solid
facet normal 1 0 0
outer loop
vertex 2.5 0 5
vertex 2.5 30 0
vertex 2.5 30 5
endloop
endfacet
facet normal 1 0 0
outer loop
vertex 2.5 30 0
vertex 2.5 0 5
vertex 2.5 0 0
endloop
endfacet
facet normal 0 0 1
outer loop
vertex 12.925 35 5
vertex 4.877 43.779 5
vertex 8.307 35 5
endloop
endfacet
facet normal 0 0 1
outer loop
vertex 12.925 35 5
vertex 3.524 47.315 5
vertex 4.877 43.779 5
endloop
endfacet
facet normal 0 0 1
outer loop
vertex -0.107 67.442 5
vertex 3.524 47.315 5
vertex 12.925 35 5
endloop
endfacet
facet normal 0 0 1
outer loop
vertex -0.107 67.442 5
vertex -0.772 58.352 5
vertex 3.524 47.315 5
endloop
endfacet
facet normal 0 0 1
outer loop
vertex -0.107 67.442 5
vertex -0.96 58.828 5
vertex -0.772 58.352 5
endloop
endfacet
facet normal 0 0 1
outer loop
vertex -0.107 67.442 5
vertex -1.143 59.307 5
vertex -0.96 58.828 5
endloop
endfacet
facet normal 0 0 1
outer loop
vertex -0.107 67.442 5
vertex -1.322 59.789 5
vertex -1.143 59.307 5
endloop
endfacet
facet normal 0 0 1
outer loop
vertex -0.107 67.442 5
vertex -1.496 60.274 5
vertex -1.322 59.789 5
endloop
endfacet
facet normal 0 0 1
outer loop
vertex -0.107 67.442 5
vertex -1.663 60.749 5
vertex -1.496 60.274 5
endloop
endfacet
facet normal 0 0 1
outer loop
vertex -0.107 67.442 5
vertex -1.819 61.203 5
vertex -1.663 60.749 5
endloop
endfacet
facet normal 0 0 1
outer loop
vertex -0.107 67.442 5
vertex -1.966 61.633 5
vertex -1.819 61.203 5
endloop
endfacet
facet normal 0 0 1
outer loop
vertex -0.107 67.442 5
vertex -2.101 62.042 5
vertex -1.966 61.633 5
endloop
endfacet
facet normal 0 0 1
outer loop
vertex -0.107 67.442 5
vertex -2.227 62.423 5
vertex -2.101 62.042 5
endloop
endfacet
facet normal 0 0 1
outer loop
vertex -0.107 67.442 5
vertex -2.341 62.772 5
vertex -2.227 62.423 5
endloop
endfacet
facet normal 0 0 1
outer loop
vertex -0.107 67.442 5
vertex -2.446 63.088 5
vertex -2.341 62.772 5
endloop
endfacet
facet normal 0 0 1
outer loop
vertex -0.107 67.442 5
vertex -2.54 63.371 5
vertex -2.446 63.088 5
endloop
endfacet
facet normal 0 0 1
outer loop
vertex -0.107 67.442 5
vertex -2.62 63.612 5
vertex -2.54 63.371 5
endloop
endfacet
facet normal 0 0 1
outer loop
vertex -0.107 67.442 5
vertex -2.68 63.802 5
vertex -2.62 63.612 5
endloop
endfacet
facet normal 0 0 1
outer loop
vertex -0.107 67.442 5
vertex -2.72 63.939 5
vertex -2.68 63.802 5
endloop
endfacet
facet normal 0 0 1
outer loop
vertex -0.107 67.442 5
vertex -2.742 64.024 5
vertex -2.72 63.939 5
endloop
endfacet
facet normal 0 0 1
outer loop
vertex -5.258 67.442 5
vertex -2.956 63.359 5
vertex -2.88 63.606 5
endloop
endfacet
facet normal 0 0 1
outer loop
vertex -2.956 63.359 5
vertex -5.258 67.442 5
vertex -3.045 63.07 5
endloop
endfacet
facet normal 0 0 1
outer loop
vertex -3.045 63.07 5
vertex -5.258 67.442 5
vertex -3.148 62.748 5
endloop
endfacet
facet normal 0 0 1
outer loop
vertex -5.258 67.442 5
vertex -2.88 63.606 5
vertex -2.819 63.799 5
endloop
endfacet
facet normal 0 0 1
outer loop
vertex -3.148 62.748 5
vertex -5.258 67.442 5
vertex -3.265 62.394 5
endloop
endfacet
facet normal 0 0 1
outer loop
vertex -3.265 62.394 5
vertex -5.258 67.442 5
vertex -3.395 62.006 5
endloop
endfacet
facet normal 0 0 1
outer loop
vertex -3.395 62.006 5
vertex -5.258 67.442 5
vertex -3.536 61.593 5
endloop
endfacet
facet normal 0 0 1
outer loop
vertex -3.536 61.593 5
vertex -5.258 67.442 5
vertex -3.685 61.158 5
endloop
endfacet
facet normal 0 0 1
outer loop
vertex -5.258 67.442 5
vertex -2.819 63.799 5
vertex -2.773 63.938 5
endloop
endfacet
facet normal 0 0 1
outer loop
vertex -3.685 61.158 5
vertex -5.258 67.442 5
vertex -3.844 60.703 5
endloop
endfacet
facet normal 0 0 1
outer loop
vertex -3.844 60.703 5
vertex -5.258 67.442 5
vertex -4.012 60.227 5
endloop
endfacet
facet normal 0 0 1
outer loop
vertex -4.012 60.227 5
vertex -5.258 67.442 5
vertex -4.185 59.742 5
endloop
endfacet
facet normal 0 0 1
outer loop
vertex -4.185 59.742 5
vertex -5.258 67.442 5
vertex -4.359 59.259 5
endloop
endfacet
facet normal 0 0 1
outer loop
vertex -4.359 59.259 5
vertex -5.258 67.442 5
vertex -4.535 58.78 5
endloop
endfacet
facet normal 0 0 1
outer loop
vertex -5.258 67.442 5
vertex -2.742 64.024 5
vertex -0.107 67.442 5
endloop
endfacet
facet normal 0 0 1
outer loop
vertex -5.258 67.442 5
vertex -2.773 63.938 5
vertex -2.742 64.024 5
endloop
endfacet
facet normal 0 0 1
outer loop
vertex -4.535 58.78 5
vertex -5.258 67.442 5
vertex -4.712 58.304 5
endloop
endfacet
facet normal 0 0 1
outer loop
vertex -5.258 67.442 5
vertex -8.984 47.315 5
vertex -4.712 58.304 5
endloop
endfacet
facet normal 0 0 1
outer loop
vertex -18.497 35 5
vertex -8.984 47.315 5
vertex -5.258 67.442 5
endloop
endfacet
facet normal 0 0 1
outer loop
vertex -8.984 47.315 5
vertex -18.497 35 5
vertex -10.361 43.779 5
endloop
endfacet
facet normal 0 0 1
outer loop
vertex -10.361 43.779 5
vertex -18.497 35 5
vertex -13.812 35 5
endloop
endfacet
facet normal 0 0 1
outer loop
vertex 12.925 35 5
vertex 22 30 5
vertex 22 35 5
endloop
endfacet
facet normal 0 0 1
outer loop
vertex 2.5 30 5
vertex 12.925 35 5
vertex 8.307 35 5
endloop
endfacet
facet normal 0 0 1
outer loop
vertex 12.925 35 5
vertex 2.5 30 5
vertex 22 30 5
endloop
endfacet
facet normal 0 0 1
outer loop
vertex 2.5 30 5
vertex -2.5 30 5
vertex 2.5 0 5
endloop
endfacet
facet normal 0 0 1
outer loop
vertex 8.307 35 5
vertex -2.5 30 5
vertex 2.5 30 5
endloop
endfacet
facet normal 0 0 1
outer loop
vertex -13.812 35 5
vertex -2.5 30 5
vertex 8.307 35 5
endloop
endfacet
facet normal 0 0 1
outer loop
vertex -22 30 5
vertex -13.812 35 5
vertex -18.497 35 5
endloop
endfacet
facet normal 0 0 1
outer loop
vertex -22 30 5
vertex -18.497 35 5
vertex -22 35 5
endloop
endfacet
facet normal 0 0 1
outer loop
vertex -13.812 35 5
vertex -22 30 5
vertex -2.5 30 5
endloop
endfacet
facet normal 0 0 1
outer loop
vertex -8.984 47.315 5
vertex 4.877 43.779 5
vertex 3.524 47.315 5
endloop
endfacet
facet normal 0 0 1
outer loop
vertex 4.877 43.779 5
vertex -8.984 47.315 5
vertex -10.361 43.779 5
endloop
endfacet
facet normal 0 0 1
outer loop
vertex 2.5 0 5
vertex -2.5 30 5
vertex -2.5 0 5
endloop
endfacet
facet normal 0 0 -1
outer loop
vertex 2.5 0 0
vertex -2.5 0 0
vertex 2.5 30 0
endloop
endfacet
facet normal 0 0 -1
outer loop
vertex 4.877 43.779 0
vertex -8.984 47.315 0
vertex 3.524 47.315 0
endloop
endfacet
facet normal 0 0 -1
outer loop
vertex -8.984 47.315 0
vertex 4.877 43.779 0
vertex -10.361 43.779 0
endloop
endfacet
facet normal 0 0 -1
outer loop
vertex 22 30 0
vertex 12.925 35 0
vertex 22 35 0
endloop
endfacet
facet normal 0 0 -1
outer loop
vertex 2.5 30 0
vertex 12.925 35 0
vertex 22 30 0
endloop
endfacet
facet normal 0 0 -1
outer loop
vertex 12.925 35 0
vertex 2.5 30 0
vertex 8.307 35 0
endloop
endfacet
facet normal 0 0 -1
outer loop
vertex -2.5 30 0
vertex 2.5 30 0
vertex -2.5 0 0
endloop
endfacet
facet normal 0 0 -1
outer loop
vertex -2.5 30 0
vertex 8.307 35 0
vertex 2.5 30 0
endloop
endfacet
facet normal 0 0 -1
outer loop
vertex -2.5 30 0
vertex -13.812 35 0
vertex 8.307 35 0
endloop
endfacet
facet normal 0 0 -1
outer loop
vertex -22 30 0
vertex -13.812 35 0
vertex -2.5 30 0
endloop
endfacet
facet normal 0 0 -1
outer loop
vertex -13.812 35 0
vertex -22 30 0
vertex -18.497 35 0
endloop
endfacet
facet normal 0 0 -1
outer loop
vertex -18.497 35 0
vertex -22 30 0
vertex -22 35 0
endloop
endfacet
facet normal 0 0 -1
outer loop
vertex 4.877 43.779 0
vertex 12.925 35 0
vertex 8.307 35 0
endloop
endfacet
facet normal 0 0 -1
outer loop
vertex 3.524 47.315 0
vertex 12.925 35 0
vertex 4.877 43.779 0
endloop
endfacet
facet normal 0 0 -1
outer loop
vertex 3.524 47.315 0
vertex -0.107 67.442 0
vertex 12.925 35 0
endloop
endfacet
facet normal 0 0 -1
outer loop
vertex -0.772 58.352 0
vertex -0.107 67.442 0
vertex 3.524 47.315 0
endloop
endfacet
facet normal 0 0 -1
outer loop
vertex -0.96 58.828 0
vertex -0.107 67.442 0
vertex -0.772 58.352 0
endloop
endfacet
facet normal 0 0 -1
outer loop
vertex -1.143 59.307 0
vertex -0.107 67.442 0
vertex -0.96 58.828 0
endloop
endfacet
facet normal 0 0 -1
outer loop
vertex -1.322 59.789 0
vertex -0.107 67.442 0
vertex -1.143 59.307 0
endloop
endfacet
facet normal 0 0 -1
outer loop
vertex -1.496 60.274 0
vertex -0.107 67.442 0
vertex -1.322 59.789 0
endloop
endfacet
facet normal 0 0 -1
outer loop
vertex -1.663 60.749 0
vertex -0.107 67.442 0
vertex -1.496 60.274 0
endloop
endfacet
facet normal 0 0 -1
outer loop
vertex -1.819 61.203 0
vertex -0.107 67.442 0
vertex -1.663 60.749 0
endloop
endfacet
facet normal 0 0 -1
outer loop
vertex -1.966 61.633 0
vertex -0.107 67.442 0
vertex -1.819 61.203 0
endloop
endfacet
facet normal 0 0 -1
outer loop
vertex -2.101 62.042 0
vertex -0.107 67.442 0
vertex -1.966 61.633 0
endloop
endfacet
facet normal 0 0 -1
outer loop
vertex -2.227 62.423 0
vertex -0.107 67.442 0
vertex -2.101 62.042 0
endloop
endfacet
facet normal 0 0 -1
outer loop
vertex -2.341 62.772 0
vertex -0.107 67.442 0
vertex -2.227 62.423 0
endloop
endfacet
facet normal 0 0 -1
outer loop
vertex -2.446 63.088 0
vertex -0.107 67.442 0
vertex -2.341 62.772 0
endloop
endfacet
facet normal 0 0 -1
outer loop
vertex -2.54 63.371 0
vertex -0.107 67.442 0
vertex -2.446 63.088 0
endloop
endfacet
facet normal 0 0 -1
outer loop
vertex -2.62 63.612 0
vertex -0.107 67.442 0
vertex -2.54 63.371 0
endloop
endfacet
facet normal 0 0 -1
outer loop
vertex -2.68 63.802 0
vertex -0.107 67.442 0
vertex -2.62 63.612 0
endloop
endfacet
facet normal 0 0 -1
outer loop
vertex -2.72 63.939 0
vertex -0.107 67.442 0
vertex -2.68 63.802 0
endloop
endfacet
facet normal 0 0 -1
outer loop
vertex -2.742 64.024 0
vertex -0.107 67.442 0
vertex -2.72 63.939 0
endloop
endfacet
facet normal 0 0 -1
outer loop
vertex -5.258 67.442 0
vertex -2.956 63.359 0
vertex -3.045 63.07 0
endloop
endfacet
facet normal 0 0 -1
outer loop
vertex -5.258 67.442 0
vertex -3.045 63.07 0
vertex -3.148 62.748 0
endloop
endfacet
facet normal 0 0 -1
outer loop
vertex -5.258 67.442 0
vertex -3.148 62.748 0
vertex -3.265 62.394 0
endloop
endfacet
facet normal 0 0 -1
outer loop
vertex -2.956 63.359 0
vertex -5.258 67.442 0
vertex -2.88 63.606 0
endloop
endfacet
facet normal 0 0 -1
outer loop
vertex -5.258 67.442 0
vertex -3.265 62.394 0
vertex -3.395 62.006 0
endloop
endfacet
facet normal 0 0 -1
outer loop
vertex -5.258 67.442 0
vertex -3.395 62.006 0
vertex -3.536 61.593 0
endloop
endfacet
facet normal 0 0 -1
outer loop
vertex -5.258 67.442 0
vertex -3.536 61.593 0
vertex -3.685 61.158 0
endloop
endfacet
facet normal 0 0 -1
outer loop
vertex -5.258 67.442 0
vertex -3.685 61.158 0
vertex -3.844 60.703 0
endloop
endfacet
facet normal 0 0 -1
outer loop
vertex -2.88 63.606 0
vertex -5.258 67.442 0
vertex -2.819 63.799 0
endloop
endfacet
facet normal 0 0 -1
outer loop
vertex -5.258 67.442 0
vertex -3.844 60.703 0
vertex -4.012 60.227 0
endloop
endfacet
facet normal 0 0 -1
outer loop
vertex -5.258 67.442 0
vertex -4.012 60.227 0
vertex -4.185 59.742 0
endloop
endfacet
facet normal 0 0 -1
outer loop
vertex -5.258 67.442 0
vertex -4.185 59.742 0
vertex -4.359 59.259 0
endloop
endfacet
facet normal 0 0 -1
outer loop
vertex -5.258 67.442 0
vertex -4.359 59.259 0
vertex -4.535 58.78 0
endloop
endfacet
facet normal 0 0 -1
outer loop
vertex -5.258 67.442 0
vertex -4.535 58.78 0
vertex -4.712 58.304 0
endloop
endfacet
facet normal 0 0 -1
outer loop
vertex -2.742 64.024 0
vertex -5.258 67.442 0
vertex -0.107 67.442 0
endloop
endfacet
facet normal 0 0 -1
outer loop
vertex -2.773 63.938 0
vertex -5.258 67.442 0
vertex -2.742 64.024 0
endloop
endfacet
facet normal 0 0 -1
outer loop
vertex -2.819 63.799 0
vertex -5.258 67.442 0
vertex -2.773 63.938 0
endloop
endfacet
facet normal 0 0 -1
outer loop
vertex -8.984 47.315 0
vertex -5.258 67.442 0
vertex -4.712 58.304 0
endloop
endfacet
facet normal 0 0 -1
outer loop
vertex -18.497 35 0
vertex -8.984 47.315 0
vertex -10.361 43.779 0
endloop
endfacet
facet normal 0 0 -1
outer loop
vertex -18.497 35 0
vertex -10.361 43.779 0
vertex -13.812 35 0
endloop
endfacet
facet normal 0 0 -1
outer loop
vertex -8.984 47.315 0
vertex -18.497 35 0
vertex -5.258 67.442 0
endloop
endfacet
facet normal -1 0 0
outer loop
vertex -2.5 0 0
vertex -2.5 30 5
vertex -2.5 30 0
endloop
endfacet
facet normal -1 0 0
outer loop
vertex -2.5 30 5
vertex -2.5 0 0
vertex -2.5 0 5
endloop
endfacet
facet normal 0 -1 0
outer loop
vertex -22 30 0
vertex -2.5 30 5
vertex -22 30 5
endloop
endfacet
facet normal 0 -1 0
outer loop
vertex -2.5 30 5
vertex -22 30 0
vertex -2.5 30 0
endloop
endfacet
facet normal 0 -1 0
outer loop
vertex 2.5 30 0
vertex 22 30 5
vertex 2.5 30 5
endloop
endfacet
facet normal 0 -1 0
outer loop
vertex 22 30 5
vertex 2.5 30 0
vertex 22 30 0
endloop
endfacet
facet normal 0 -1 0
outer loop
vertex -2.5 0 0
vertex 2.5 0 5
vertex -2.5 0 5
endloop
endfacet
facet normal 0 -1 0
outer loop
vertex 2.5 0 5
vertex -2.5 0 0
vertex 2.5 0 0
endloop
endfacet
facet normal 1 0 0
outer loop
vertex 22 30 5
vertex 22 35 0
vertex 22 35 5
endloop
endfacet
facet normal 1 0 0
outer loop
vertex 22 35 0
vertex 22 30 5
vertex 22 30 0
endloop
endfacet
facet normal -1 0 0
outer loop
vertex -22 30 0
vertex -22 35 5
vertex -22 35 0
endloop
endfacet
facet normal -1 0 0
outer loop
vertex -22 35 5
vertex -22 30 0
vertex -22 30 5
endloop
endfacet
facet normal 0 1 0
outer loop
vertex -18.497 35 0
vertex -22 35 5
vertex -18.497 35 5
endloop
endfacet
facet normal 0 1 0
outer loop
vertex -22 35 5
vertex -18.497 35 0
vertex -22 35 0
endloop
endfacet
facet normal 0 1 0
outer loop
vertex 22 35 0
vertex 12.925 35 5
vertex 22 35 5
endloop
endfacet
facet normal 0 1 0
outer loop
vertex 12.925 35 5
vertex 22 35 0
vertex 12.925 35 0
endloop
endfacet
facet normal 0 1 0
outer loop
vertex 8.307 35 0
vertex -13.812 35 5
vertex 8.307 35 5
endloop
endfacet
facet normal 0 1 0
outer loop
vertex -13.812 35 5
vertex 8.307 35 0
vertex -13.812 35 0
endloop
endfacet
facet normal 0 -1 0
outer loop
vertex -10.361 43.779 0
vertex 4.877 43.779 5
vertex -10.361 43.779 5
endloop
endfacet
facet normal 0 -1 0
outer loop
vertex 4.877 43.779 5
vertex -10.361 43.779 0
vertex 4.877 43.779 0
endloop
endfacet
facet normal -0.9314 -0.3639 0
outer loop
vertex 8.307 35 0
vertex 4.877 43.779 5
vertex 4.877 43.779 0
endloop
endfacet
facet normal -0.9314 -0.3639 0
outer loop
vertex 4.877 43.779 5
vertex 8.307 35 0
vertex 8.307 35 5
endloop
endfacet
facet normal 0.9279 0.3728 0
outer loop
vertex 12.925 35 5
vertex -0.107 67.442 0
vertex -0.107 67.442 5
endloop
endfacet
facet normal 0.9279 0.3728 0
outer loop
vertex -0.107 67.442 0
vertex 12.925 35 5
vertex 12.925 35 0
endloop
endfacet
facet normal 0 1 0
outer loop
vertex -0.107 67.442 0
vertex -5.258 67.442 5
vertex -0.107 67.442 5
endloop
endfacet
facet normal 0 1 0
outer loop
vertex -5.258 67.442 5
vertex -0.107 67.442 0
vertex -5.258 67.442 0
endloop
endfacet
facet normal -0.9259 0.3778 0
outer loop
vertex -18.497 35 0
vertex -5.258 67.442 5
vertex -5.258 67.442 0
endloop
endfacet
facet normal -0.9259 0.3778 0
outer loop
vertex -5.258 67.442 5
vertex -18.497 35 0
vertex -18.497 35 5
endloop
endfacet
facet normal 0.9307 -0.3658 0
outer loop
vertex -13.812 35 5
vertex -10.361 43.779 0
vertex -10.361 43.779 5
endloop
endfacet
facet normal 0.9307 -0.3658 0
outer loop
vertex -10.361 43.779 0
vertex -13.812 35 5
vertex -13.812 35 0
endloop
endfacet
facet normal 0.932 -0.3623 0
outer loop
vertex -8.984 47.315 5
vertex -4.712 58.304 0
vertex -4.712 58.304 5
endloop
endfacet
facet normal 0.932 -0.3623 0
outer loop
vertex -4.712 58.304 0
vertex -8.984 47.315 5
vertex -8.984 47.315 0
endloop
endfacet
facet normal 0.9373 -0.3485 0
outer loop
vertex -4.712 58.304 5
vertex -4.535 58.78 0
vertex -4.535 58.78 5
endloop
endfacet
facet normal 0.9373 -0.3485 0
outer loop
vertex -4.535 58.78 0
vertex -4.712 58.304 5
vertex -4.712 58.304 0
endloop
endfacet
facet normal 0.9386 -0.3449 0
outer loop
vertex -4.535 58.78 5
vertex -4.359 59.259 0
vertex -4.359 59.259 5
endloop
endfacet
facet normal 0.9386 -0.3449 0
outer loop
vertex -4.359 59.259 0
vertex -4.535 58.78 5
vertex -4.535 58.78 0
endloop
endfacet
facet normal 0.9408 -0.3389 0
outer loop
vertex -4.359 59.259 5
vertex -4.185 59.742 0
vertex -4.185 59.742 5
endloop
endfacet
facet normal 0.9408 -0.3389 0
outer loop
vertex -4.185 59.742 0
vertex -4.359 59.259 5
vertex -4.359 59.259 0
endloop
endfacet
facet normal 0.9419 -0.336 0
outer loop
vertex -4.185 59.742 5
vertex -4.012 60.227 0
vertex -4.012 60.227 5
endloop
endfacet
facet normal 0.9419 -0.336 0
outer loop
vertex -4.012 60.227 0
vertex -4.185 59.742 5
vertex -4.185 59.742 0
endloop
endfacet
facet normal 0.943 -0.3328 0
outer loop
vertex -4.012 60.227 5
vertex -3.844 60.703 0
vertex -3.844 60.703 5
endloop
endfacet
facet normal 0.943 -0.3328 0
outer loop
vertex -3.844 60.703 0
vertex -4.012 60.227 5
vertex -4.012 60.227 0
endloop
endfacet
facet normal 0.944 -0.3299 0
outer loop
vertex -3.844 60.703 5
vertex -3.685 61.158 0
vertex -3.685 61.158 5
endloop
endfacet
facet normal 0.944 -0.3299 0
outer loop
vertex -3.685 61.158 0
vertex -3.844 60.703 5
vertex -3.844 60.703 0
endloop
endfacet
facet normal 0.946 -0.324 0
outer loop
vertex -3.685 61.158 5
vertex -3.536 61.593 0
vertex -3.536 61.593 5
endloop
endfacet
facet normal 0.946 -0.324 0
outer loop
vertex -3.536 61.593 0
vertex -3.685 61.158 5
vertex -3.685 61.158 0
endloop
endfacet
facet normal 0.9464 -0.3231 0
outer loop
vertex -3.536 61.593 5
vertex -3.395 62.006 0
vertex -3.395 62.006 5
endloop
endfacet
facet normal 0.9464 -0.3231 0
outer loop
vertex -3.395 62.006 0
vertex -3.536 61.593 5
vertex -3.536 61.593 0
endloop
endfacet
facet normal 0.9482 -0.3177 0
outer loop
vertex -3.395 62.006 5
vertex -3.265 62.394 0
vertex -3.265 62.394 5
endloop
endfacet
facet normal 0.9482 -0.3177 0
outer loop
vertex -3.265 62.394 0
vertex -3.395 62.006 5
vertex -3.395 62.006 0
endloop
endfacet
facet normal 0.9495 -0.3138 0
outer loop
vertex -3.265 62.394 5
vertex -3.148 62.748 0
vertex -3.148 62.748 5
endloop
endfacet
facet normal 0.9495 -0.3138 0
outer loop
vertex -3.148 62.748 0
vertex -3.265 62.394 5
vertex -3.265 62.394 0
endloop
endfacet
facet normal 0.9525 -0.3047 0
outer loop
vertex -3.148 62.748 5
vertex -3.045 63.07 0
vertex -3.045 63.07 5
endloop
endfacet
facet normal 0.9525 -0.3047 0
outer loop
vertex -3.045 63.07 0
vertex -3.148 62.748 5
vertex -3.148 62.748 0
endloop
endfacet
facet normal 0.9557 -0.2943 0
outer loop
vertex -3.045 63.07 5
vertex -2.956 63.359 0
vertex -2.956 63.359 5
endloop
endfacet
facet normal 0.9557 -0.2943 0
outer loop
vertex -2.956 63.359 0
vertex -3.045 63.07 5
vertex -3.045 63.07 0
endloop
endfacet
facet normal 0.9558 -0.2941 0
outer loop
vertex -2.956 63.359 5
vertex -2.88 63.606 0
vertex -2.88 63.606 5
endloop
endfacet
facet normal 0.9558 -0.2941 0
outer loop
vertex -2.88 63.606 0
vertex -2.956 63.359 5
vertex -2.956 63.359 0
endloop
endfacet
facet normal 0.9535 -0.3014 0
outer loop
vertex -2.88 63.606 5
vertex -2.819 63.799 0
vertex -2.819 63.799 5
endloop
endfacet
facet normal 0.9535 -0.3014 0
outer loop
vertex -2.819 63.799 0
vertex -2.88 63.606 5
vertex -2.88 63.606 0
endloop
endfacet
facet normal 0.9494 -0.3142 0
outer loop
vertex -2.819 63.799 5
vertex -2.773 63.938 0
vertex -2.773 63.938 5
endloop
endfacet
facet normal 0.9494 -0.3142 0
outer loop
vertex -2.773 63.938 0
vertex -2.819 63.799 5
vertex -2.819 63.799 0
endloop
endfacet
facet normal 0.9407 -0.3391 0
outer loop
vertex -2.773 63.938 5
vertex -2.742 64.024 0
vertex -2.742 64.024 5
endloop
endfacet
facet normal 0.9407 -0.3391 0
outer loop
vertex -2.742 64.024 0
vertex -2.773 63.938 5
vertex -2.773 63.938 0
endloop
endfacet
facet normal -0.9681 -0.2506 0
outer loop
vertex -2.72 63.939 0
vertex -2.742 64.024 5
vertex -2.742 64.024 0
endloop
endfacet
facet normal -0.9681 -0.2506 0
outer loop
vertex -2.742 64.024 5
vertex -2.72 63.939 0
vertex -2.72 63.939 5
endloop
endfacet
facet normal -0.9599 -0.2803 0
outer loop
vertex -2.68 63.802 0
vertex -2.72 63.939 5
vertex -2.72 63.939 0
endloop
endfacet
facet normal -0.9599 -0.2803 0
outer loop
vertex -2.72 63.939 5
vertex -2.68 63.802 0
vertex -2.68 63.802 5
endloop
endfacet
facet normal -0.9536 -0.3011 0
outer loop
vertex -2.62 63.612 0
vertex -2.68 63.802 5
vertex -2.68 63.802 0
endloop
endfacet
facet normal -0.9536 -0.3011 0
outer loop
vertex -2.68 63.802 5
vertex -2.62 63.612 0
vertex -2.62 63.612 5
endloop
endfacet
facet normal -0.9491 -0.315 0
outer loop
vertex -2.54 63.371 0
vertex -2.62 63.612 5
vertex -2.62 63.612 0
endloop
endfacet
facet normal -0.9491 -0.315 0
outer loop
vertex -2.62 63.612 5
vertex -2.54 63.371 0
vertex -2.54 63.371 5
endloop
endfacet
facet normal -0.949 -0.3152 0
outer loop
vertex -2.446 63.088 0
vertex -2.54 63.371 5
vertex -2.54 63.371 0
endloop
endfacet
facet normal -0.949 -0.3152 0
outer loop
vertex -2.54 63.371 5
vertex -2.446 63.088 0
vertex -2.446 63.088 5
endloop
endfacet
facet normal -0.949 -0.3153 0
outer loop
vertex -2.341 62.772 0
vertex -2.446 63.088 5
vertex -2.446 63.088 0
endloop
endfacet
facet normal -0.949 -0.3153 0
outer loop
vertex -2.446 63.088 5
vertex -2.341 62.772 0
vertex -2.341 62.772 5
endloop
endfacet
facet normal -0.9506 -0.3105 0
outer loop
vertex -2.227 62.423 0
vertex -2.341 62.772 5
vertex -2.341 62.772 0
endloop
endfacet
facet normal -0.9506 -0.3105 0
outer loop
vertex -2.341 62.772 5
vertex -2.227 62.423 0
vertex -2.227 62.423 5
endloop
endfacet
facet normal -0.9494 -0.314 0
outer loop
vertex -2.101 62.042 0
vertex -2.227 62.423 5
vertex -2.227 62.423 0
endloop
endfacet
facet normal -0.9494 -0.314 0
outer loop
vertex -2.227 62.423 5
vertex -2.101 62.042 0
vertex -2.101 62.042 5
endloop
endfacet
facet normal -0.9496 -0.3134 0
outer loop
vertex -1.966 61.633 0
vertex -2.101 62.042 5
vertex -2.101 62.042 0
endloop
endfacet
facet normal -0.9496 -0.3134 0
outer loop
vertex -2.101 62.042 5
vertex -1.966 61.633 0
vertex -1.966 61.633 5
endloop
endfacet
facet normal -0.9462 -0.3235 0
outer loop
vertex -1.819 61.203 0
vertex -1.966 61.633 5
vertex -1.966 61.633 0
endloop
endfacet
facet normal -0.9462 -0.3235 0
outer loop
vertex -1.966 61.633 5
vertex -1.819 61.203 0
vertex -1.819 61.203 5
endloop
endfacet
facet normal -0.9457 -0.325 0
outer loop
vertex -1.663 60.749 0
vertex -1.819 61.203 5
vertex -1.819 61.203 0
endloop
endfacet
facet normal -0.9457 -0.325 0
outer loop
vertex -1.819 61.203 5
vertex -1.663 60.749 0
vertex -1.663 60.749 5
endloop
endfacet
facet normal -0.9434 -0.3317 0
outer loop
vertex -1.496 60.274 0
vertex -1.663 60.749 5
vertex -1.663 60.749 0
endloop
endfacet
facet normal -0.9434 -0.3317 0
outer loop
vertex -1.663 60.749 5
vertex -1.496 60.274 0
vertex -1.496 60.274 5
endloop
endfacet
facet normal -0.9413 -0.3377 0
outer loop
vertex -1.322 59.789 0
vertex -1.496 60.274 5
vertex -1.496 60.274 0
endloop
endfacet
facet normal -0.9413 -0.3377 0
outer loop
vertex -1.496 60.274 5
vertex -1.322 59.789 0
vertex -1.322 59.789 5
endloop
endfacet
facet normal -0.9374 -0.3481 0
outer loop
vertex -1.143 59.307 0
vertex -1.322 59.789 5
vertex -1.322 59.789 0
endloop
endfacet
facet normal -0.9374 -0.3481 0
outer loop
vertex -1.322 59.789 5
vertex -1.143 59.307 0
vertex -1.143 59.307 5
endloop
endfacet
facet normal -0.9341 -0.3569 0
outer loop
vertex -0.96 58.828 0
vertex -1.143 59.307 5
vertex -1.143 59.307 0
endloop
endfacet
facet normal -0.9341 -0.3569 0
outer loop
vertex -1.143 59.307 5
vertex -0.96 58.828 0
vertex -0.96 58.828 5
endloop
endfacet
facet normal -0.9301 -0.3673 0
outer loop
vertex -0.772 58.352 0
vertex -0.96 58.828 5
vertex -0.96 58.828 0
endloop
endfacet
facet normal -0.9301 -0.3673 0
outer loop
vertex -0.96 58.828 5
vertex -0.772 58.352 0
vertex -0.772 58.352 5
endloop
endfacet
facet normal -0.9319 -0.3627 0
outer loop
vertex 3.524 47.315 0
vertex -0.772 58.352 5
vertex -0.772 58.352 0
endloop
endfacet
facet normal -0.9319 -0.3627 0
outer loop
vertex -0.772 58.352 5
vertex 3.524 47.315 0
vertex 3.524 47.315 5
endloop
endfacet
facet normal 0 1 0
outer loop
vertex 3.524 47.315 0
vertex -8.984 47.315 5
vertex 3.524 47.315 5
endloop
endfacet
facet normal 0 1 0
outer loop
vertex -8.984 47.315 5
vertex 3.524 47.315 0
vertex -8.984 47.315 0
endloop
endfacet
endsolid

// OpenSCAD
// Olimpics 2016
// By Magonegro JUL-2016
// Customizer for the Olympics Rio2016 rotating logo

// Stake height
HEIGHT=30;
// Custom text in the platter:
TEXT="A";
// Text size:
TEXTSIZE=35;
// To adjust X text pos :
XTEXTOFFSET=3;
// To adjust Y text pos (assure text is attached to baseline):
YTEXTOFFSET=-1;

/// [hidden]
STAKE=5; // 5mm square stake fixed

union()
{
    translate([-STAKE/2,0,0]) cube([STAKE,HEIGHT,STAKE]);
    translate([-22,HEIGHT,0]) cube([44,STAKE,STAKE]);
    translate([XTEXTOFFSET-22,HEIGHT+STAKE+YTEXTOFFSET,0]) 
        linear_extrude(height = STAKE, convexity = 10)
        text(TEXT, font = "Arial:style=Black",size=TEXTSIZE);
}
